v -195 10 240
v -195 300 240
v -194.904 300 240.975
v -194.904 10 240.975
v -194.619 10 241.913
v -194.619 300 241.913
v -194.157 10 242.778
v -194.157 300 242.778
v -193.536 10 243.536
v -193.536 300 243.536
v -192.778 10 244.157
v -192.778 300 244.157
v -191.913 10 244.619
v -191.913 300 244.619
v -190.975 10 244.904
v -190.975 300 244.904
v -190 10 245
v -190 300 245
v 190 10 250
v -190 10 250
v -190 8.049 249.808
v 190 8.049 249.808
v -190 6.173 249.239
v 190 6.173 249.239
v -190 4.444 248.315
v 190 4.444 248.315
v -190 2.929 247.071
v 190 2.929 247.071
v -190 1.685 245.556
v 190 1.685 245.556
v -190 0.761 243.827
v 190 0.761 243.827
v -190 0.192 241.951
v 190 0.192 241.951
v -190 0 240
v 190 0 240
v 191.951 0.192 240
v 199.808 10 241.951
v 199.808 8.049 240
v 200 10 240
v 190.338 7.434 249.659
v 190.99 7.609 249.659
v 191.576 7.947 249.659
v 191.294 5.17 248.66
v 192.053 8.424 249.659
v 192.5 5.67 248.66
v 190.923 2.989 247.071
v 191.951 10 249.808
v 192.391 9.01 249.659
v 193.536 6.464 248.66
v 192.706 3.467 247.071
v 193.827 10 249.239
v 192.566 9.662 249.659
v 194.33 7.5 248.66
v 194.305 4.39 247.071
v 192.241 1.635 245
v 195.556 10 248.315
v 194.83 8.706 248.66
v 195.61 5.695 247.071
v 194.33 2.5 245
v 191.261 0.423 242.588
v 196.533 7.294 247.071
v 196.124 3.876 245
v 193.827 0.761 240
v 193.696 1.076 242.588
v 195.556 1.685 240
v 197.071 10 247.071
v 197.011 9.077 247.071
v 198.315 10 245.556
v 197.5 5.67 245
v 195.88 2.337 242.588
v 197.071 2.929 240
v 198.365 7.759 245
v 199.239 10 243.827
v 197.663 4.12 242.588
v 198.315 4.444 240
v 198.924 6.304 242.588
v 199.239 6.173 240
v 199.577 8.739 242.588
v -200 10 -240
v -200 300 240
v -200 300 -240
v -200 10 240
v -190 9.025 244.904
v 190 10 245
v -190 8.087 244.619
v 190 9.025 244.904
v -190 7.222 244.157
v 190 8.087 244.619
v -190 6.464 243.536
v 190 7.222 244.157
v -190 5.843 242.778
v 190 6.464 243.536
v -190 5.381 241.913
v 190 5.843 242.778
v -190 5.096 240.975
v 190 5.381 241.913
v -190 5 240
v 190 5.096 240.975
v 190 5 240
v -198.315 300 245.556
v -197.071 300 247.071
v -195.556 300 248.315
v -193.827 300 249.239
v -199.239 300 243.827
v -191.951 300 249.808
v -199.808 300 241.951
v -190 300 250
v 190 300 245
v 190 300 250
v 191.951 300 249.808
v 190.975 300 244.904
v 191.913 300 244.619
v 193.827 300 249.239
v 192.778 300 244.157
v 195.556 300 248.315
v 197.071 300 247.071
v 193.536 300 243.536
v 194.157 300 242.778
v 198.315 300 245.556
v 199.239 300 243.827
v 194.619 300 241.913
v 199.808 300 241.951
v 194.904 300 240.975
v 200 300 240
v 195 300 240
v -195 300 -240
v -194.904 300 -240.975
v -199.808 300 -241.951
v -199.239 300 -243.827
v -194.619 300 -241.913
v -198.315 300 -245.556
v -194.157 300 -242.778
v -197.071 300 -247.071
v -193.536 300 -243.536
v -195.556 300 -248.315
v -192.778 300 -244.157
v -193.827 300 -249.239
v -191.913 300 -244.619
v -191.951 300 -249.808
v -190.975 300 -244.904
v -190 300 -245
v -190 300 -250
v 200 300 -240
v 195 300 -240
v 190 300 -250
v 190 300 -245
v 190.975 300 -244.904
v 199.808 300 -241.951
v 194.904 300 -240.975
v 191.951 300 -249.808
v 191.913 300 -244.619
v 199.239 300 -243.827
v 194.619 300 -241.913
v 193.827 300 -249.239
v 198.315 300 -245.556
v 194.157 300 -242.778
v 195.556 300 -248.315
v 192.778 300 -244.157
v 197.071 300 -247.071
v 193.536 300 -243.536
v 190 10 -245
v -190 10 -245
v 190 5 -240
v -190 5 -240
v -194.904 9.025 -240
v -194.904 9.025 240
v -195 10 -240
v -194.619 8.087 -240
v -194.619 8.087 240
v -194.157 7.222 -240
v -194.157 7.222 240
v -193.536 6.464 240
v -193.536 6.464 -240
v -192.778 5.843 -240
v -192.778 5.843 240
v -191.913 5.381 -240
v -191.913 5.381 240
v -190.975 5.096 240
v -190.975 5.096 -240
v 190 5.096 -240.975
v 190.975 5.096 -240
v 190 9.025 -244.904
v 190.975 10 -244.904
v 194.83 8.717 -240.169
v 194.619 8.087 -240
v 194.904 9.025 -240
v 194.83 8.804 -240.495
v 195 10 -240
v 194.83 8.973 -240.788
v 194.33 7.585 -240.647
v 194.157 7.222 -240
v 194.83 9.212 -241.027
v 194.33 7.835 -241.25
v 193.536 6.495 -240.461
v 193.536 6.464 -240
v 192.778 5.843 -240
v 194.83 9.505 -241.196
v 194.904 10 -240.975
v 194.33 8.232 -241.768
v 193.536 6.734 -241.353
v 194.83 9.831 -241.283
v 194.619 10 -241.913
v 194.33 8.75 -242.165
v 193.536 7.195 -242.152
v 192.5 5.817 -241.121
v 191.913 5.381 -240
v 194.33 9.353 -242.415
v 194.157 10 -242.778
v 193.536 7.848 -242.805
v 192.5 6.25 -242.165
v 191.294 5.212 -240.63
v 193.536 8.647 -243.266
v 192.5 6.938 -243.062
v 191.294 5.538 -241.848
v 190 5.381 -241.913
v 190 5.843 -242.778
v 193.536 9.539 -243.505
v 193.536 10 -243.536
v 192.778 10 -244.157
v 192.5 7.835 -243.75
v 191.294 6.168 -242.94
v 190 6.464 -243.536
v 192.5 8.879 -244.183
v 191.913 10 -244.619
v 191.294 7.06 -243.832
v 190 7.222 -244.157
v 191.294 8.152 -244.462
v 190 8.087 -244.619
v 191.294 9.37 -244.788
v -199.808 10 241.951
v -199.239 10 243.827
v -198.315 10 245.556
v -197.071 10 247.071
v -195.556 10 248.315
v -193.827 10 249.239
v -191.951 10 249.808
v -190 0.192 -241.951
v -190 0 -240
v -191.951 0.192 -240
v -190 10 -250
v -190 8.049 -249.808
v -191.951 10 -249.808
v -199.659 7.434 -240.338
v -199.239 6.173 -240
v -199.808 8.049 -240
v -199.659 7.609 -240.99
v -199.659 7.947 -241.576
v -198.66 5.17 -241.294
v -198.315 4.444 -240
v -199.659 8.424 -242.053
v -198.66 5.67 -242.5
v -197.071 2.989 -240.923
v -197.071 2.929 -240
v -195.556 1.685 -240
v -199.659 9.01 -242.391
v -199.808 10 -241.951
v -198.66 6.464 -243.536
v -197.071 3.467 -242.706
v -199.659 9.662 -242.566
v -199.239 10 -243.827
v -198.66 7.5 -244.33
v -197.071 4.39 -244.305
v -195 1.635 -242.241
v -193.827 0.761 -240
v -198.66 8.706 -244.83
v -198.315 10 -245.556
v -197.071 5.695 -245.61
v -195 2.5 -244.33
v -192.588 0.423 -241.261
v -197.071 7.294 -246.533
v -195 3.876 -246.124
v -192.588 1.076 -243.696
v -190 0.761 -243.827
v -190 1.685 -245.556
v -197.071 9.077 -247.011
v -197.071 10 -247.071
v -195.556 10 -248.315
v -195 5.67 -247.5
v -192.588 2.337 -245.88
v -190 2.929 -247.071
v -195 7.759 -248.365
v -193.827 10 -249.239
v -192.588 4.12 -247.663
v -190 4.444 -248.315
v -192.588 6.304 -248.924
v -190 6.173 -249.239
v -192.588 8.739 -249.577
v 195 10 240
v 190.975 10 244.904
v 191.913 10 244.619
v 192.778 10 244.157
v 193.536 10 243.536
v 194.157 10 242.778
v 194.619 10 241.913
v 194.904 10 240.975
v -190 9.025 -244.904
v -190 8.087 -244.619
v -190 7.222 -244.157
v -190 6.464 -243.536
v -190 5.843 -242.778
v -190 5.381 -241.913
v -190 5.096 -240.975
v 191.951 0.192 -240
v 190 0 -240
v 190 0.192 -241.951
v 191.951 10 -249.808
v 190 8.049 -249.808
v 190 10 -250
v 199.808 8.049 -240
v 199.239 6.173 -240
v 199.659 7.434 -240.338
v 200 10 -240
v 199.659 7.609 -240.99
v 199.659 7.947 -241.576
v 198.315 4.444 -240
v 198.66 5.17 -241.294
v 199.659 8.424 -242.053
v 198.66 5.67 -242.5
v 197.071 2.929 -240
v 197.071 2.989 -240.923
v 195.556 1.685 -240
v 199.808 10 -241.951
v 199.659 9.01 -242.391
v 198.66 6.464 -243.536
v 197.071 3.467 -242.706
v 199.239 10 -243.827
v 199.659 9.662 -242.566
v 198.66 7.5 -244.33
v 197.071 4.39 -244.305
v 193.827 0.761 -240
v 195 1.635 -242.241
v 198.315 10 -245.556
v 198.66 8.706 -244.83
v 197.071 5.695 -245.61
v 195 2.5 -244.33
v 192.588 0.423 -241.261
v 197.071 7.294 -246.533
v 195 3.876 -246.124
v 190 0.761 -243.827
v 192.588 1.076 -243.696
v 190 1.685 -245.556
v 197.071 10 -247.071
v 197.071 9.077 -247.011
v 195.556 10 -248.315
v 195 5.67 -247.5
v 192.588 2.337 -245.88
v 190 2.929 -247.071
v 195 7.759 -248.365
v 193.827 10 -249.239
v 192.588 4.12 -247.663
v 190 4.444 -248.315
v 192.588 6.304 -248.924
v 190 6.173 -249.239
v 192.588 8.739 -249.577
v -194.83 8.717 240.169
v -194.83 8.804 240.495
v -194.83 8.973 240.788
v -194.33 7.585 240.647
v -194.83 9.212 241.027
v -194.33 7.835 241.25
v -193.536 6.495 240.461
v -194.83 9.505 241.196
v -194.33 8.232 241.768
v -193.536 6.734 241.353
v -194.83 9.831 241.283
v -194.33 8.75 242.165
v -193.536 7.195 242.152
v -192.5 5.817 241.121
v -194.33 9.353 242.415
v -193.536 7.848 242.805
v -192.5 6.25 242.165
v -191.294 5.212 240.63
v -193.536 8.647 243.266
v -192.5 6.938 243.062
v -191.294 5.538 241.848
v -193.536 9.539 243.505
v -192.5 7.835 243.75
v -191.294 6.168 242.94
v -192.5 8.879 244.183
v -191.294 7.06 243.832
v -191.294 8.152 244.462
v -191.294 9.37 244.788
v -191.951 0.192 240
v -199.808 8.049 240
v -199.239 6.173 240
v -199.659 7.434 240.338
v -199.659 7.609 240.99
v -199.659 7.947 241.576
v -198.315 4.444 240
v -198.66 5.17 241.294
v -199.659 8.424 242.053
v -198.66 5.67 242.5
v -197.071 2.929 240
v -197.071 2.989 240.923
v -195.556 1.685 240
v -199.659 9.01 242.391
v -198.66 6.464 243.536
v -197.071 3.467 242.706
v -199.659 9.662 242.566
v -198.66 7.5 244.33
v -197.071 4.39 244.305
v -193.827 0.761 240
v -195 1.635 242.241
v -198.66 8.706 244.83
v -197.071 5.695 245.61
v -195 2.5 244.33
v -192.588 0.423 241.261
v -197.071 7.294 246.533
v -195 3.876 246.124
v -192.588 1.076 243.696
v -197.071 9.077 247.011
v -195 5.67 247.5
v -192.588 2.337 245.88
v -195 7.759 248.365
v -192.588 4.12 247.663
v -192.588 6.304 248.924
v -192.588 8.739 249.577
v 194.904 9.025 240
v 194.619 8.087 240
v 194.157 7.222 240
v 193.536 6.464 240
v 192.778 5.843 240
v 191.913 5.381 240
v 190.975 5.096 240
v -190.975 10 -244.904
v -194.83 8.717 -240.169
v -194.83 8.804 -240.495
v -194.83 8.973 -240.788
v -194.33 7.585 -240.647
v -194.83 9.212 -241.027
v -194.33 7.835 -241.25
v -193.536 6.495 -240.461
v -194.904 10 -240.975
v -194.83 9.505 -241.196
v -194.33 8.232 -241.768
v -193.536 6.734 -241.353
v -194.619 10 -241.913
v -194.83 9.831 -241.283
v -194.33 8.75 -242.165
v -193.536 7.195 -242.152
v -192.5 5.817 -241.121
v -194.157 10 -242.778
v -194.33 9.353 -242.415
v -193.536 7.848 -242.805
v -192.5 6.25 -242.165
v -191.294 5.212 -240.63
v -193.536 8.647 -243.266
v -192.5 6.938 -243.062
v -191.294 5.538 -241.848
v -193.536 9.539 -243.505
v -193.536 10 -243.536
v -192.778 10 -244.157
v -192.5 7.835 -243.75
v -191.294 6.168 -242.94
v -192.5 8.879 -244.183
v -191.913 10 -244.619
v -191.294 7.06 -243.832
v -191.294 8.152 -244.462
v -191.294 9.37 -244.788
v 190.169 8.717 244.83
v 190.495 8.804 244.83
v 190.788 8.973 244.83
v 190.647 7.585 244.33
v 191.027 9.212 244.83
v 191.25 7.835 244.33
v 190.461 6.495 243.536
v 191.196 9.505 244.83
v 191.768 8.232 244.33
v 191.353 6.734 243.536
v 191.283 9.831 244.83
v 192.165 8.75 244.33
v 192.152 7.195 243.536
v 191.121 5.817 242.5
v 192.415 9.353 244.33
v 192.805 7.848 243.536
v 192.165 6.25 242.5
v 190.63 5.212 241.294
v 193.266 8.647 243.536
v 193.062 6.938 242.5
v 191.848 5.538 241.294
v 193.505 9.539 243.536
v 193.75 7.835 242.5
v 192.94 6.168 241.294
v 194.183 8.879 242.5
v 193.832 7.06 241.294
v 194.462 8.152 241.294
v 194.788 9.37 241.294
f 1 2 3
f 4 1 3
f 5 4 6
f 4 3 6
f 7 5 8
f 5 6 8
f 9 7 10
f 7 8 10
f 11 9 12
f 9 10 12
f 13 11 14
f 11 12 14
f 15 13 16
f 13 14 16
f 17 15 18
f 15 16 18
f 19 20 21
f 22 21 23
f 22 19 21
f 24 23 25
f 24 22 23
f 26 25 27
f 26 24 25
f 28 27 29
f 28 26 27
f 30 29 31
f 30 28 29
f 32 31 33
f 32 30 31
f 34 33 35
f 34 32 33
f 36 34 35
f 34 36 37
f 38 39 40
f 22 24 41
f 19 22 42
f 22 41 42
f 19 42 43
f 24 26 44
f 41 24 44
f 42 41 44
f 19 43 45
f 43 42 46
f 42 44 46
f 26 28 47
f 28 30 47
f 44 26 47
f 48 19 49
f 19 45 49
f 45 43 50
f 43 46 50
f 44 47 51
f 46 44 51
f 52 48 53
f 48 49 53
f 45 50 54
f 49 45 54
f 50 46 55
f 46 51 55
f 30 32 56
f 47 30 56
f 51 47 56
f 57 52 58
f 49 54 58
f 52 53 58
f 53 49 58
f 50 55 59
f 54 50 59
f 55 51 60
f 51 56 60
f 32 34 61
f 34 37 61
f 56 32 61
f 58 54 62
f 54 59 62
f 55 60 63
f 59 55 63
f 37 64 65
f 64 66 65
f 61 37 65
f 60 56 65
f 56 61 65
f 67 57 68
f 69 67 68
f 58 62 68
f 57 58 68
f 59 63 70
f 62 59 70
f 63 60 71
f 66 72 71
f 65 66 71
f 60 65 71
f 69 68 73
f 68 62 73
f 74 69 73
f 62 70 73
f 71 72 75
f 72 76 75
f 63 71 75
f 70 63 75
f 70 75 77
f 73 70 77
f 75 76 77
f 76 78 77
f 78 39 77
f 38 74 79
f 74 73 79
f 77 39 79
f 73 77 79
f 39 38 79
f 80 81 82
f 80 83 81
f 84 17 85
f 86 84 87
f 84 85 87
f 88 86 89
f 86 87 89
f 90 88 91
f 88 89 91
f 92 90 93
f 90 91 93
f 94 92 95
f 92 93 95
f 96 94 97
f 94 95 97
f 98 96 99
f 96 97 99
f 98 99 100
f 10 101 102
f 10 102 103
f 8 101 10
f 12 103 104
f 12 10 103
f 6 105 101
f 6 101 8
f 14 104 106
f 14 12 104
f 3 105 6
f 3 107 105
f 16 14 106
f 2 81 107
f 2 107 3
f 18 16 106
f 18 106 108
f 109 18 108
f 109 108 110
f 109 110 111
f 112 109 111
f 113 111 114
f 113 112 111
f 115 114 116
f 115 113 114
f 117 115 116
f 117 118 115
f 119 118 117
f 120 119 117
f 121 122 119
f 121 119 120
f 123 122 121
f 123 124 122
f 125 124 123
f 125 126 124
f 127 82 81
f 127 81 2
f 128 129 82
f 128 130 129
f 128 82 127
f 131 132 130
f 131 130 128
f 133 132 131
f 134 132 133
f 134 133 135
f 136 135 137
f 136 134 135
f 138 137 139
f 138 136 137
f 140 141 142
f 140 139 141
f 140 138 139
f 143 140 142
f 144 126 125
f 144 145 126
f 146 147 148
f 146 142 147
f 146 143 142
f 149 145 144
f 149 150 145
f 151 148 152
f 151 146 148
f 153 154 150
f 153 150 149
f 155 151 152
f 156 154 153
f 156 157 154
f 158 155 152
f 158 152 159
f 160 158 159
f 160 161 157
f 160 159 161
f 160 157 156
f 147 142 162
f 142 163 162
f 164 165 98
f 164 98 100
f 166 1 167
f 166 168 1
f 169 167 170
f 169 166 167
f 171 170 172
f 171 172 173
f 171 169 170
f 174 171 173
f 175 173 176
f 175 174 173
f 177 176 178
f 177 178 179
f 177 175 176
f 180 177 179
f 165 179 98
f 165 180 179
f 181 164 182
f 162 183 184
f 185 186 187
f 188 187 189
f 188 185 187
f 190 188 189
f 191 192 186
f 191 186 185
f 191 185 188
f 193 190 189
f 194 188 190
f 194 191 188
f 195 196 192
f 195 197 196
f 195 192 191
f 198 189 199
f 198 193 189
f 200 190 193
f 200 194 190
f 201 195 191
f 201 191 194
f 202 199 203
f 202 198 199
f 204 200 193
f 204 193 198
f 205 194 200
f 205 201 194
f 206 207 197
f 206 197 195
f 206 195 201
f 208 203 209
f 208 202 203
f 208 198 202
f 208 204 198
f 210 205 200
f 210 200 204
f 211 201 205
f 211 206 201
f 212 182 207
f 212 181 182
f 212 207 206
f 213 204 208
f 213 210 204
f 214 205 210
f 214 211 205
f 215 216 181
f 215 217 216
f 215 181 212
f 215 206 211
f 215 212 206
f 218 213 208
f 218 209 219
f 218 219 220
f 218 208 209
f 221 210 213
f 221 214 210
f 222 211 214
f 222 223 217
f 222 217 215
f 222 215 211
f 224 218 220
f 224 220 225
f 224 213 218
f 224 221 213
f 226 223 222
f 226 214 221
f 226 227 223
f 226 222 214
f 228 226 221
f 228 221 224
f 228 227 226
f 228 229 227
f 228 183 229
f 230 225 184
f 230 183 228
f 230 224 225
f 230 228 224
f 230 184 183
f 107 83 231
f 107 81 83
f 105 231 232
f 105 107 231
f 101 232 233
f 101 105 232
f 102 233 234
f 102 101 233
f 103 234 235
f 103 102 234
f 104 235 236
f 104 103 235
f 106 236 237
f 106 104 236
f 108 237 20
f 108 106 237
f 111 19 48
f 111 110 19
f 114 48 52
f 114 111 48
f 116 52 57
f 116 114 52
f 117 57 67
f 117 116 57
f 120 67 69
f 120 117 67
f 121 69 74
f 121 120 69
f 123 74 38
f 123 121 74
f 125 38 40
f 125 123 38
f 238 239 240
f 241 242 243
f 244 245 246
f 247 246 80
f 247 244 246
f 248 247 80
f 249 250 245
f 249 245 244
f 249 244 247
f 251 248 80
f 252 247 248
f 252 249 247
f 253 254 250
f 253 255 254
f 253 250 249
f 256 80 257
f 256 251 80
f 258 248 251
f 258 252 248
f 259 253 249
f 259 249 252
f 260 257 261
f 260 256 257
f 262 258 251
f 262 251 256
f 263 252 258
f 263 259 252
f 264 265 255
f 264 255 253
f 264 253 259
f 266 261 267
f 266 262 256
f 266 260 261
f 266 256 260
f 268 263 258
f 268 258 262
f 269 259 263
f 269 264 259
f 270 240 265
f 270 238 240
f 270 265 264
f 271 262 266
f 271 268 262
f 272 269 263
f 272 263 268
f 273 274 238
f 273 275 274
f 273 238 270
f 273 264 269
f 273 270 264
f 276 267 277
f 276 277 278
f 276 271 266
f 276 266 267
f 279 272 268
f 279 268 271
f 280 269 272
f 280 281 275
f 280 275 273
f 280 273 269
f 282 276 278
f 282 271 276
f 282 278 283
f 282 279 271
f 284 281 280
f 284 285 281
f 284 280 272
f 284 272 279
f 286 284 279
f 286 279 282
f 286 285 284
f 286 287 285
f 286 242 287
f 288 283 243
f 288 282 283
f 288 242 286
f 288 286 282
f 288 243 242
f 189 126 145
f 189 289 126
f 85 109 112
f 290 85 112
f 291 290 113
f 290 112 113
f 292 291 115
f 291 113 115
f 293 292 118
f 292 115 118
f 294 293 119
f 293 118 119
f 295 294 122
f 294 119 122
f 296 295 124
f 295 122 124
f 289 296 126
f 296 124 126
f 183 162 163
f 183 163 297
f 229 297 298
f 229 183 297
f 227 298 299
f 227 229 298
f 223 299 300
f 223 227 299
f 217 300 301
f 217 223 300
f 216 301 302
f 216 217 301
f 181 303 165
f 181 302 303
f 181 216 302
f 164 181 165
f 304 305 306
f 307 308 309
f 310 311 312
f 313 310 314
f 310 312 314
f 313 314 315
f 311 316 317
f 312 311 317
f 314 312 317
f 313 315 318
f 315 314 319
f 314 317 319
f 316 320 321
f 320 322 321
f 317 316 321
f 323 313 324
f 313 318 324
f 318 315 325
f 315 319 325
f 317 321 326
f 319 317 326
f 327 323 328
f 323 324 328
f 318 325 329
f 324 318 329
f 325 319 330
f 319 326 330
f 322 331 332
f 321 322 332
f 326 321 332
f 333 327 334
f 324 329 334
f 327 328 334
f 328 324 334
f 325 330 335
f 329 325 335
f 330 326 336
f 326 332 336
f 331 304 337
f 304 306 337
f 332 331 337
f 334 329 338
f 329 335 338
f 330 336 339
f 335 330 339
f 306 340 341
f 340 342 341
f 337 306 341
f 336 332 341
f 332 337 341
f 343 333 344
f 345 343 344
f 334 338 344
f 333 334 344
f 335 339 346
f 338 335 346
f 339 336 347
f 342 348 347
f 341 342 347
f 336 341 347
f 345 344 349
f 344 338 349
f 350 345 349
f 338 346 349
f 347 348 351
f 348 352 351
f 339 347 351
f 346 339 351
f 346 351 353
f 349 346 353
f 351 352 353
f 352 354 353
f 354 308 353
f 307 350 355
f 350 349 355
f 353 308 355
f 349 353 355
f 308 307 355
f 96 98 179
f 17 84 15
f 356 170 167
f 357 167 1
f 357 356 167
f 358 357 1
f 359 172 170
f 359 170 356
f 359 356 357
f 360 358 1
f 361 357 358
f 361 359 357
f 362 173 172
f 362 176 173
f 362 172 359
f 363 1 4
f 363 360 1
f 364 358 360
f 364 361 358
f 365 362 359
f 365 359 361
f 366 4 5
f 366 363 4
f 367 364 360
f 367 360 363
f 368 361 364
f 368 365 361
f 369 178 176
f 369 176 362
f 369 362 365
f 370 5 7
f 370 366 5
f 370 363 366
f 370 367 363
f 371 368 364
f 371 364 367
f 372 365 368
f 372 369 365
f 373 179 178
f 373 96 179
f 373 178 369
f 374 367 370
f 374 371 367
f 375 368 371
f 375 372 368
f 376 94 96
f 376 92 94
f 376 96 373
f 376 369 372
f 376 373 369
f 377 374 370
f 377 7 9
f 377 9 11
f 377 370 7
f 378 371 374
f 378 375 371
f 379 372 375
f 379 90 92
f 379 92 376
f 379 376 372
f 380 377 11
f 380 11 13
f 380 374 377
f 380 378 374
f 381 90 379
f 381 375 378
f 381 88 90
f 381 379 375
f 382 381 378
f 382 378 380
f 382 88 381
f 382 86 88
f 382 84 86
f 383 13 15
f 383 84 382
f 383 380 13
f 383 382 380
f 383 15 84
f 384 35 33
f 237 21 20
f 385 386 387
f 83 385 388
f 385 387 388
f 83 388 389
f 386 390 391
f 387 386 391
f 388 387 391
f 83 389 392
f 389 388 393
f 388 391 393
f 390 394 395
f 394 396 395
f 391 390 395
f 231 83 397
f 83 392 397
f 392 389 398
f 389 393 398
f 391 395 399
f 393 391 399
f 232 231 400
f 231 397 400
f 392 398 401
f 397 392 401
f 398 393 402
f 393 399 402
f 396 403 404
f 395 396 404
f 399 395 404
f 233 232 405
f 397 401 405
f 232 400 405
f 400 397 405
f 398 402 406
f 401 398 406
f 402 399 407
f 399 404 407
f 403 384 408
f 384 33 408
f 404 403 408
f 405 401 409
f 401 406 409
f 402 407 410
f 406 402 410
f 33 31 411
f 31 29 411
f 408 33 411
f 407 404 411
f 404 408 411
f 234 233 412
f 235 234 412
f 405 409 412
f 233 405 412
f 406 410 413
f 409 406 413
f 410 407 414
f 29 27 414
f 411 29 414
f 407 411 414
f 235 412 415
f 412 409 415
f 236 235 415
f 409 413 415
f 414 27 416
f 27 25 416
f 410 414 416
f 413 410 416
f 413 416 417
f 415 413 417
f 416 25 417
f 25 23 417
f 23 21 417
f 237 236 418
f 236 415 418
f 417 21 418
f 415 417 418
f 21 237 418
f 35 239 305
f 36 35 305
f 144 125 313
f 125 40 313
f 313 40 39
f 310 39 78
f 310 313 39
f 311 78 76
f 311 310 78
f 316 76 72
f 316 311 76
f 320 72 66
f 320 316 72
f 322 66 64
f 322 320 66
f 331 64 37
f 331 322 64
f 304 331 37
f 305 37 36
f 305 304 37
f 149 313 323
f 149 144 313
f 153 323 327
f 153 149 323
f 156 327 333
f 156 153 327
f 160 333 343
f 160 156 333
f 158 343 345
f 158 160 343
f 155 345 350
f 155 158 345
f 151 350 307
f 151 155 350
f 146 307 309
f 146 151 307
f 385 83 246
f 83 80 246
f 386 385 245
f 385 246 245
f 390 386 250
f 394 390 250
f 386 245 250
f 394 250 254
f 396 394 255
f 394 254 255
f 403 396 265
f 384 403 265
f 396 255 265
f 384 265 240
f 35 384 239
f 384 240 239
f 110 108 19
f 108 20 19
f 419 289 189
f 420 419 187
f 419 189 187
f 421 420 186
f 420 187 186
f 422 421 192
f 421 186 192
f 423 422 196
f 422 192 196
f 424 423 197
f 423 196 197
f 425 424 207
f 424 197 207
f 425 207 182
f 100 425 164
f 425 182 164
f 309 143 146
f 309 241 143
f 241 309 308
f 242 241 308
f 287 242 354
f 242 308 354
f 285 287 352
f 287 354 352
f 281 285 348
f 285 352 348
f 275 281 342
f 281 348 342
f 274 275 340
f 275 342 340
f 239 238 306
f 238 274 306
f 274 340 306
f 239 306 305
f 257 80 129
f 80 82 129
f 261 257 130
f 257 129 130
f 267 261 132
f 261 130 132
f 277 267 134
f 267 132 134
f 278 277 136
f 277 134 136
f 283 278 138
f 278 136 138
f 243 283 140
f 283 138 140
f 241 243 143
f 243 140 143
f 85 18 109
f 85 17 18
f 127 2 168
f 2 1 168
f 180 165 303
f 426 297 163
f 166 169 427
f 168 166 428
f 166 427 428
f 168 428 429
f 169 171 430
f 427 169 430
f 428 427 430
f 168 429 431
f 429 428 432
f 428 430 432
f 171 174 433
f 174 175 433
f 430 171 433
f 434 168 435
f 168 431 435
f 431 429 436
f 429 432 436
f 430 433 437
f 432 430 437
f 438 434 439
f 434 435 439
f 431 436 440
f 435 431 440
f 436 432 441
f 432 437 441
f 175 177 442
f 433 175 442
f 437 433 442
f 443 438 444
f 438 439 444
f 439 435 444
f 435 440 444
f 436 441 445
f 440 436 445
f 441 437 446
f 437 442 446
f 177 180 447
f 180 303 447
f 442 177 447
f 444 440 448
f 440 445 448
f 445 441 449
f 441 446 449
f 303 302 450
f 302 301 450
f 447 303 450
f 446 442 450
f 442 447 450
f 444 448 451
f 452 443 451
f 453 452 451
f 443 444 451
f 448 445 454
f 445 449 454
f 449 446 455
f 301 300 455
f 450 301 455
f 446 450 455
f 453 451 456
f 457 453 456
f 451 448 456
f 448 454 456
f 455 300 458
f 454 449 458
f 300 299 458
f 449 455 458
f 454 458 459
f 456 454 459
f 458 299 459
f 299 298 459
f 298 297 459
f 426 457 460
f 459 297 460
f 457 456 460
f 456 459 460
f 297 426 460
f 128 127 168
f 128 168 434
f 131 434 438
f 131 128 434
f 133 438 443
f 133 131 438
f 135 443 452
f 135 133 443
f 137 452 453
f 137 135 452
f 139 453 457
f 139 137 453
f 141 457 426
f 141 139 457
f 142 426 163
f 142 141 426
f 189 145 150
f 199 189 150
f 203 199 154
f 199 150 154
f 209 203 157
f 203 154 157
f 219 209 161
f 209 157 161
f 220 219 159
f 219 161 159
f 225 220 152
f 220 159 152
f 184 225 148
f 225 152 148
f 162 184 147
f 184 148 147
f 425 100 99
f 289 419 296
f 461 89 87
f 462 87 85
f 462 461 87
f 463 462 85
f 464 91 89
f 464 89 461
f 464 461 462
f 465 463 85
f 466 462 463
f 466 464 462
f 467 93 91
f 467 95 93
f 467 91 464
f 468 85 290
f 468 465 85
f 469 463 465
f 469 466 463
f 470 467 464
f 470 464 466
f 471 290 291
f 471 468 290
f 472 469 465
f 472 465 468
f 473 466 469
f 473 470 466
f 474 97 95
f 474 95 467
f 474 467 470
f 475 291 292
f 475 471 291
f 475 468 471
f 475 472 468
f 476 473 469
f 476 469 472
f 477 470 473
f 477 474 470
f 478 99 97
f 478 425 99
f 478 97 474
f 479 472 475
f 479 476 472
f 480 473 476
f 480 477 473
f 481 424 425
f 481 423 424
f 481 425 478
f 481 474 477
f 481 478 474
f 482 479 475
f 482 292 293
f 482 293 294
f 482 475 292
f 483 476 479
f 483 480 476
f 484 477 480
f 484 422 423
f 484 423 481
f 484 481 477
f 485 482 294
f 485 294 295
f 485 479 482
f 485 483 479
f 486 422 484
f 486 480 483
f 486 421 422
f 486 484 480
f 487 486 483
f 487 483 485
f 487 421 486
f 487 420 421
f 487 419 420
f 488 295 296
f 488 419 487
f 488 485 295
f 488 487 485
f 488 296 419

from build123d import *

# Parameters (mm, degrees)
CROQUIS1_W     = 400
CROQUIS1_H     = 500
EXTRUIR1_DEPTH = 300
REDONDEO1_R    = 10
VACIADO1_T     = -5


with BuildPart() as part:
    # Croquis1 → Extruir1 (new body)
    with BuildSketch(Plane(origin=(0, 0, 0), x_dir=(1, 0, 0), z_dir=(0, 1, 0))):
        Rectangle(CROQUIS1_W, CROQUIS1_H)
    extrude(amount=EXTRUIR1_DEPTH)

    # Redondeo1
    redondeo1_edges = [part.edges().sort_by_distance(p)[0] for p in [
        (0, 0, -250),
        (200, 0, 0),
        (0, 0, 250),
        (-200, 0, 0),
        (-200, 150, -250),
        (200, 150, -250),
        (200, 150, 250),
        (-200, 150, 250),
    ]]
    fillet(redondeo1_edges, radius=REDONDEO1_R)

    # Vaciado1
    vaciado1_openings = [part.faces().sort_by_distance(p)[0] for p in [
        (0, 300, 0),
    ]]
    offset(amount=VACIADO1_T, openings=vaciado1_openings, kind=Kind.INTERSECTION)


solid = part.part
